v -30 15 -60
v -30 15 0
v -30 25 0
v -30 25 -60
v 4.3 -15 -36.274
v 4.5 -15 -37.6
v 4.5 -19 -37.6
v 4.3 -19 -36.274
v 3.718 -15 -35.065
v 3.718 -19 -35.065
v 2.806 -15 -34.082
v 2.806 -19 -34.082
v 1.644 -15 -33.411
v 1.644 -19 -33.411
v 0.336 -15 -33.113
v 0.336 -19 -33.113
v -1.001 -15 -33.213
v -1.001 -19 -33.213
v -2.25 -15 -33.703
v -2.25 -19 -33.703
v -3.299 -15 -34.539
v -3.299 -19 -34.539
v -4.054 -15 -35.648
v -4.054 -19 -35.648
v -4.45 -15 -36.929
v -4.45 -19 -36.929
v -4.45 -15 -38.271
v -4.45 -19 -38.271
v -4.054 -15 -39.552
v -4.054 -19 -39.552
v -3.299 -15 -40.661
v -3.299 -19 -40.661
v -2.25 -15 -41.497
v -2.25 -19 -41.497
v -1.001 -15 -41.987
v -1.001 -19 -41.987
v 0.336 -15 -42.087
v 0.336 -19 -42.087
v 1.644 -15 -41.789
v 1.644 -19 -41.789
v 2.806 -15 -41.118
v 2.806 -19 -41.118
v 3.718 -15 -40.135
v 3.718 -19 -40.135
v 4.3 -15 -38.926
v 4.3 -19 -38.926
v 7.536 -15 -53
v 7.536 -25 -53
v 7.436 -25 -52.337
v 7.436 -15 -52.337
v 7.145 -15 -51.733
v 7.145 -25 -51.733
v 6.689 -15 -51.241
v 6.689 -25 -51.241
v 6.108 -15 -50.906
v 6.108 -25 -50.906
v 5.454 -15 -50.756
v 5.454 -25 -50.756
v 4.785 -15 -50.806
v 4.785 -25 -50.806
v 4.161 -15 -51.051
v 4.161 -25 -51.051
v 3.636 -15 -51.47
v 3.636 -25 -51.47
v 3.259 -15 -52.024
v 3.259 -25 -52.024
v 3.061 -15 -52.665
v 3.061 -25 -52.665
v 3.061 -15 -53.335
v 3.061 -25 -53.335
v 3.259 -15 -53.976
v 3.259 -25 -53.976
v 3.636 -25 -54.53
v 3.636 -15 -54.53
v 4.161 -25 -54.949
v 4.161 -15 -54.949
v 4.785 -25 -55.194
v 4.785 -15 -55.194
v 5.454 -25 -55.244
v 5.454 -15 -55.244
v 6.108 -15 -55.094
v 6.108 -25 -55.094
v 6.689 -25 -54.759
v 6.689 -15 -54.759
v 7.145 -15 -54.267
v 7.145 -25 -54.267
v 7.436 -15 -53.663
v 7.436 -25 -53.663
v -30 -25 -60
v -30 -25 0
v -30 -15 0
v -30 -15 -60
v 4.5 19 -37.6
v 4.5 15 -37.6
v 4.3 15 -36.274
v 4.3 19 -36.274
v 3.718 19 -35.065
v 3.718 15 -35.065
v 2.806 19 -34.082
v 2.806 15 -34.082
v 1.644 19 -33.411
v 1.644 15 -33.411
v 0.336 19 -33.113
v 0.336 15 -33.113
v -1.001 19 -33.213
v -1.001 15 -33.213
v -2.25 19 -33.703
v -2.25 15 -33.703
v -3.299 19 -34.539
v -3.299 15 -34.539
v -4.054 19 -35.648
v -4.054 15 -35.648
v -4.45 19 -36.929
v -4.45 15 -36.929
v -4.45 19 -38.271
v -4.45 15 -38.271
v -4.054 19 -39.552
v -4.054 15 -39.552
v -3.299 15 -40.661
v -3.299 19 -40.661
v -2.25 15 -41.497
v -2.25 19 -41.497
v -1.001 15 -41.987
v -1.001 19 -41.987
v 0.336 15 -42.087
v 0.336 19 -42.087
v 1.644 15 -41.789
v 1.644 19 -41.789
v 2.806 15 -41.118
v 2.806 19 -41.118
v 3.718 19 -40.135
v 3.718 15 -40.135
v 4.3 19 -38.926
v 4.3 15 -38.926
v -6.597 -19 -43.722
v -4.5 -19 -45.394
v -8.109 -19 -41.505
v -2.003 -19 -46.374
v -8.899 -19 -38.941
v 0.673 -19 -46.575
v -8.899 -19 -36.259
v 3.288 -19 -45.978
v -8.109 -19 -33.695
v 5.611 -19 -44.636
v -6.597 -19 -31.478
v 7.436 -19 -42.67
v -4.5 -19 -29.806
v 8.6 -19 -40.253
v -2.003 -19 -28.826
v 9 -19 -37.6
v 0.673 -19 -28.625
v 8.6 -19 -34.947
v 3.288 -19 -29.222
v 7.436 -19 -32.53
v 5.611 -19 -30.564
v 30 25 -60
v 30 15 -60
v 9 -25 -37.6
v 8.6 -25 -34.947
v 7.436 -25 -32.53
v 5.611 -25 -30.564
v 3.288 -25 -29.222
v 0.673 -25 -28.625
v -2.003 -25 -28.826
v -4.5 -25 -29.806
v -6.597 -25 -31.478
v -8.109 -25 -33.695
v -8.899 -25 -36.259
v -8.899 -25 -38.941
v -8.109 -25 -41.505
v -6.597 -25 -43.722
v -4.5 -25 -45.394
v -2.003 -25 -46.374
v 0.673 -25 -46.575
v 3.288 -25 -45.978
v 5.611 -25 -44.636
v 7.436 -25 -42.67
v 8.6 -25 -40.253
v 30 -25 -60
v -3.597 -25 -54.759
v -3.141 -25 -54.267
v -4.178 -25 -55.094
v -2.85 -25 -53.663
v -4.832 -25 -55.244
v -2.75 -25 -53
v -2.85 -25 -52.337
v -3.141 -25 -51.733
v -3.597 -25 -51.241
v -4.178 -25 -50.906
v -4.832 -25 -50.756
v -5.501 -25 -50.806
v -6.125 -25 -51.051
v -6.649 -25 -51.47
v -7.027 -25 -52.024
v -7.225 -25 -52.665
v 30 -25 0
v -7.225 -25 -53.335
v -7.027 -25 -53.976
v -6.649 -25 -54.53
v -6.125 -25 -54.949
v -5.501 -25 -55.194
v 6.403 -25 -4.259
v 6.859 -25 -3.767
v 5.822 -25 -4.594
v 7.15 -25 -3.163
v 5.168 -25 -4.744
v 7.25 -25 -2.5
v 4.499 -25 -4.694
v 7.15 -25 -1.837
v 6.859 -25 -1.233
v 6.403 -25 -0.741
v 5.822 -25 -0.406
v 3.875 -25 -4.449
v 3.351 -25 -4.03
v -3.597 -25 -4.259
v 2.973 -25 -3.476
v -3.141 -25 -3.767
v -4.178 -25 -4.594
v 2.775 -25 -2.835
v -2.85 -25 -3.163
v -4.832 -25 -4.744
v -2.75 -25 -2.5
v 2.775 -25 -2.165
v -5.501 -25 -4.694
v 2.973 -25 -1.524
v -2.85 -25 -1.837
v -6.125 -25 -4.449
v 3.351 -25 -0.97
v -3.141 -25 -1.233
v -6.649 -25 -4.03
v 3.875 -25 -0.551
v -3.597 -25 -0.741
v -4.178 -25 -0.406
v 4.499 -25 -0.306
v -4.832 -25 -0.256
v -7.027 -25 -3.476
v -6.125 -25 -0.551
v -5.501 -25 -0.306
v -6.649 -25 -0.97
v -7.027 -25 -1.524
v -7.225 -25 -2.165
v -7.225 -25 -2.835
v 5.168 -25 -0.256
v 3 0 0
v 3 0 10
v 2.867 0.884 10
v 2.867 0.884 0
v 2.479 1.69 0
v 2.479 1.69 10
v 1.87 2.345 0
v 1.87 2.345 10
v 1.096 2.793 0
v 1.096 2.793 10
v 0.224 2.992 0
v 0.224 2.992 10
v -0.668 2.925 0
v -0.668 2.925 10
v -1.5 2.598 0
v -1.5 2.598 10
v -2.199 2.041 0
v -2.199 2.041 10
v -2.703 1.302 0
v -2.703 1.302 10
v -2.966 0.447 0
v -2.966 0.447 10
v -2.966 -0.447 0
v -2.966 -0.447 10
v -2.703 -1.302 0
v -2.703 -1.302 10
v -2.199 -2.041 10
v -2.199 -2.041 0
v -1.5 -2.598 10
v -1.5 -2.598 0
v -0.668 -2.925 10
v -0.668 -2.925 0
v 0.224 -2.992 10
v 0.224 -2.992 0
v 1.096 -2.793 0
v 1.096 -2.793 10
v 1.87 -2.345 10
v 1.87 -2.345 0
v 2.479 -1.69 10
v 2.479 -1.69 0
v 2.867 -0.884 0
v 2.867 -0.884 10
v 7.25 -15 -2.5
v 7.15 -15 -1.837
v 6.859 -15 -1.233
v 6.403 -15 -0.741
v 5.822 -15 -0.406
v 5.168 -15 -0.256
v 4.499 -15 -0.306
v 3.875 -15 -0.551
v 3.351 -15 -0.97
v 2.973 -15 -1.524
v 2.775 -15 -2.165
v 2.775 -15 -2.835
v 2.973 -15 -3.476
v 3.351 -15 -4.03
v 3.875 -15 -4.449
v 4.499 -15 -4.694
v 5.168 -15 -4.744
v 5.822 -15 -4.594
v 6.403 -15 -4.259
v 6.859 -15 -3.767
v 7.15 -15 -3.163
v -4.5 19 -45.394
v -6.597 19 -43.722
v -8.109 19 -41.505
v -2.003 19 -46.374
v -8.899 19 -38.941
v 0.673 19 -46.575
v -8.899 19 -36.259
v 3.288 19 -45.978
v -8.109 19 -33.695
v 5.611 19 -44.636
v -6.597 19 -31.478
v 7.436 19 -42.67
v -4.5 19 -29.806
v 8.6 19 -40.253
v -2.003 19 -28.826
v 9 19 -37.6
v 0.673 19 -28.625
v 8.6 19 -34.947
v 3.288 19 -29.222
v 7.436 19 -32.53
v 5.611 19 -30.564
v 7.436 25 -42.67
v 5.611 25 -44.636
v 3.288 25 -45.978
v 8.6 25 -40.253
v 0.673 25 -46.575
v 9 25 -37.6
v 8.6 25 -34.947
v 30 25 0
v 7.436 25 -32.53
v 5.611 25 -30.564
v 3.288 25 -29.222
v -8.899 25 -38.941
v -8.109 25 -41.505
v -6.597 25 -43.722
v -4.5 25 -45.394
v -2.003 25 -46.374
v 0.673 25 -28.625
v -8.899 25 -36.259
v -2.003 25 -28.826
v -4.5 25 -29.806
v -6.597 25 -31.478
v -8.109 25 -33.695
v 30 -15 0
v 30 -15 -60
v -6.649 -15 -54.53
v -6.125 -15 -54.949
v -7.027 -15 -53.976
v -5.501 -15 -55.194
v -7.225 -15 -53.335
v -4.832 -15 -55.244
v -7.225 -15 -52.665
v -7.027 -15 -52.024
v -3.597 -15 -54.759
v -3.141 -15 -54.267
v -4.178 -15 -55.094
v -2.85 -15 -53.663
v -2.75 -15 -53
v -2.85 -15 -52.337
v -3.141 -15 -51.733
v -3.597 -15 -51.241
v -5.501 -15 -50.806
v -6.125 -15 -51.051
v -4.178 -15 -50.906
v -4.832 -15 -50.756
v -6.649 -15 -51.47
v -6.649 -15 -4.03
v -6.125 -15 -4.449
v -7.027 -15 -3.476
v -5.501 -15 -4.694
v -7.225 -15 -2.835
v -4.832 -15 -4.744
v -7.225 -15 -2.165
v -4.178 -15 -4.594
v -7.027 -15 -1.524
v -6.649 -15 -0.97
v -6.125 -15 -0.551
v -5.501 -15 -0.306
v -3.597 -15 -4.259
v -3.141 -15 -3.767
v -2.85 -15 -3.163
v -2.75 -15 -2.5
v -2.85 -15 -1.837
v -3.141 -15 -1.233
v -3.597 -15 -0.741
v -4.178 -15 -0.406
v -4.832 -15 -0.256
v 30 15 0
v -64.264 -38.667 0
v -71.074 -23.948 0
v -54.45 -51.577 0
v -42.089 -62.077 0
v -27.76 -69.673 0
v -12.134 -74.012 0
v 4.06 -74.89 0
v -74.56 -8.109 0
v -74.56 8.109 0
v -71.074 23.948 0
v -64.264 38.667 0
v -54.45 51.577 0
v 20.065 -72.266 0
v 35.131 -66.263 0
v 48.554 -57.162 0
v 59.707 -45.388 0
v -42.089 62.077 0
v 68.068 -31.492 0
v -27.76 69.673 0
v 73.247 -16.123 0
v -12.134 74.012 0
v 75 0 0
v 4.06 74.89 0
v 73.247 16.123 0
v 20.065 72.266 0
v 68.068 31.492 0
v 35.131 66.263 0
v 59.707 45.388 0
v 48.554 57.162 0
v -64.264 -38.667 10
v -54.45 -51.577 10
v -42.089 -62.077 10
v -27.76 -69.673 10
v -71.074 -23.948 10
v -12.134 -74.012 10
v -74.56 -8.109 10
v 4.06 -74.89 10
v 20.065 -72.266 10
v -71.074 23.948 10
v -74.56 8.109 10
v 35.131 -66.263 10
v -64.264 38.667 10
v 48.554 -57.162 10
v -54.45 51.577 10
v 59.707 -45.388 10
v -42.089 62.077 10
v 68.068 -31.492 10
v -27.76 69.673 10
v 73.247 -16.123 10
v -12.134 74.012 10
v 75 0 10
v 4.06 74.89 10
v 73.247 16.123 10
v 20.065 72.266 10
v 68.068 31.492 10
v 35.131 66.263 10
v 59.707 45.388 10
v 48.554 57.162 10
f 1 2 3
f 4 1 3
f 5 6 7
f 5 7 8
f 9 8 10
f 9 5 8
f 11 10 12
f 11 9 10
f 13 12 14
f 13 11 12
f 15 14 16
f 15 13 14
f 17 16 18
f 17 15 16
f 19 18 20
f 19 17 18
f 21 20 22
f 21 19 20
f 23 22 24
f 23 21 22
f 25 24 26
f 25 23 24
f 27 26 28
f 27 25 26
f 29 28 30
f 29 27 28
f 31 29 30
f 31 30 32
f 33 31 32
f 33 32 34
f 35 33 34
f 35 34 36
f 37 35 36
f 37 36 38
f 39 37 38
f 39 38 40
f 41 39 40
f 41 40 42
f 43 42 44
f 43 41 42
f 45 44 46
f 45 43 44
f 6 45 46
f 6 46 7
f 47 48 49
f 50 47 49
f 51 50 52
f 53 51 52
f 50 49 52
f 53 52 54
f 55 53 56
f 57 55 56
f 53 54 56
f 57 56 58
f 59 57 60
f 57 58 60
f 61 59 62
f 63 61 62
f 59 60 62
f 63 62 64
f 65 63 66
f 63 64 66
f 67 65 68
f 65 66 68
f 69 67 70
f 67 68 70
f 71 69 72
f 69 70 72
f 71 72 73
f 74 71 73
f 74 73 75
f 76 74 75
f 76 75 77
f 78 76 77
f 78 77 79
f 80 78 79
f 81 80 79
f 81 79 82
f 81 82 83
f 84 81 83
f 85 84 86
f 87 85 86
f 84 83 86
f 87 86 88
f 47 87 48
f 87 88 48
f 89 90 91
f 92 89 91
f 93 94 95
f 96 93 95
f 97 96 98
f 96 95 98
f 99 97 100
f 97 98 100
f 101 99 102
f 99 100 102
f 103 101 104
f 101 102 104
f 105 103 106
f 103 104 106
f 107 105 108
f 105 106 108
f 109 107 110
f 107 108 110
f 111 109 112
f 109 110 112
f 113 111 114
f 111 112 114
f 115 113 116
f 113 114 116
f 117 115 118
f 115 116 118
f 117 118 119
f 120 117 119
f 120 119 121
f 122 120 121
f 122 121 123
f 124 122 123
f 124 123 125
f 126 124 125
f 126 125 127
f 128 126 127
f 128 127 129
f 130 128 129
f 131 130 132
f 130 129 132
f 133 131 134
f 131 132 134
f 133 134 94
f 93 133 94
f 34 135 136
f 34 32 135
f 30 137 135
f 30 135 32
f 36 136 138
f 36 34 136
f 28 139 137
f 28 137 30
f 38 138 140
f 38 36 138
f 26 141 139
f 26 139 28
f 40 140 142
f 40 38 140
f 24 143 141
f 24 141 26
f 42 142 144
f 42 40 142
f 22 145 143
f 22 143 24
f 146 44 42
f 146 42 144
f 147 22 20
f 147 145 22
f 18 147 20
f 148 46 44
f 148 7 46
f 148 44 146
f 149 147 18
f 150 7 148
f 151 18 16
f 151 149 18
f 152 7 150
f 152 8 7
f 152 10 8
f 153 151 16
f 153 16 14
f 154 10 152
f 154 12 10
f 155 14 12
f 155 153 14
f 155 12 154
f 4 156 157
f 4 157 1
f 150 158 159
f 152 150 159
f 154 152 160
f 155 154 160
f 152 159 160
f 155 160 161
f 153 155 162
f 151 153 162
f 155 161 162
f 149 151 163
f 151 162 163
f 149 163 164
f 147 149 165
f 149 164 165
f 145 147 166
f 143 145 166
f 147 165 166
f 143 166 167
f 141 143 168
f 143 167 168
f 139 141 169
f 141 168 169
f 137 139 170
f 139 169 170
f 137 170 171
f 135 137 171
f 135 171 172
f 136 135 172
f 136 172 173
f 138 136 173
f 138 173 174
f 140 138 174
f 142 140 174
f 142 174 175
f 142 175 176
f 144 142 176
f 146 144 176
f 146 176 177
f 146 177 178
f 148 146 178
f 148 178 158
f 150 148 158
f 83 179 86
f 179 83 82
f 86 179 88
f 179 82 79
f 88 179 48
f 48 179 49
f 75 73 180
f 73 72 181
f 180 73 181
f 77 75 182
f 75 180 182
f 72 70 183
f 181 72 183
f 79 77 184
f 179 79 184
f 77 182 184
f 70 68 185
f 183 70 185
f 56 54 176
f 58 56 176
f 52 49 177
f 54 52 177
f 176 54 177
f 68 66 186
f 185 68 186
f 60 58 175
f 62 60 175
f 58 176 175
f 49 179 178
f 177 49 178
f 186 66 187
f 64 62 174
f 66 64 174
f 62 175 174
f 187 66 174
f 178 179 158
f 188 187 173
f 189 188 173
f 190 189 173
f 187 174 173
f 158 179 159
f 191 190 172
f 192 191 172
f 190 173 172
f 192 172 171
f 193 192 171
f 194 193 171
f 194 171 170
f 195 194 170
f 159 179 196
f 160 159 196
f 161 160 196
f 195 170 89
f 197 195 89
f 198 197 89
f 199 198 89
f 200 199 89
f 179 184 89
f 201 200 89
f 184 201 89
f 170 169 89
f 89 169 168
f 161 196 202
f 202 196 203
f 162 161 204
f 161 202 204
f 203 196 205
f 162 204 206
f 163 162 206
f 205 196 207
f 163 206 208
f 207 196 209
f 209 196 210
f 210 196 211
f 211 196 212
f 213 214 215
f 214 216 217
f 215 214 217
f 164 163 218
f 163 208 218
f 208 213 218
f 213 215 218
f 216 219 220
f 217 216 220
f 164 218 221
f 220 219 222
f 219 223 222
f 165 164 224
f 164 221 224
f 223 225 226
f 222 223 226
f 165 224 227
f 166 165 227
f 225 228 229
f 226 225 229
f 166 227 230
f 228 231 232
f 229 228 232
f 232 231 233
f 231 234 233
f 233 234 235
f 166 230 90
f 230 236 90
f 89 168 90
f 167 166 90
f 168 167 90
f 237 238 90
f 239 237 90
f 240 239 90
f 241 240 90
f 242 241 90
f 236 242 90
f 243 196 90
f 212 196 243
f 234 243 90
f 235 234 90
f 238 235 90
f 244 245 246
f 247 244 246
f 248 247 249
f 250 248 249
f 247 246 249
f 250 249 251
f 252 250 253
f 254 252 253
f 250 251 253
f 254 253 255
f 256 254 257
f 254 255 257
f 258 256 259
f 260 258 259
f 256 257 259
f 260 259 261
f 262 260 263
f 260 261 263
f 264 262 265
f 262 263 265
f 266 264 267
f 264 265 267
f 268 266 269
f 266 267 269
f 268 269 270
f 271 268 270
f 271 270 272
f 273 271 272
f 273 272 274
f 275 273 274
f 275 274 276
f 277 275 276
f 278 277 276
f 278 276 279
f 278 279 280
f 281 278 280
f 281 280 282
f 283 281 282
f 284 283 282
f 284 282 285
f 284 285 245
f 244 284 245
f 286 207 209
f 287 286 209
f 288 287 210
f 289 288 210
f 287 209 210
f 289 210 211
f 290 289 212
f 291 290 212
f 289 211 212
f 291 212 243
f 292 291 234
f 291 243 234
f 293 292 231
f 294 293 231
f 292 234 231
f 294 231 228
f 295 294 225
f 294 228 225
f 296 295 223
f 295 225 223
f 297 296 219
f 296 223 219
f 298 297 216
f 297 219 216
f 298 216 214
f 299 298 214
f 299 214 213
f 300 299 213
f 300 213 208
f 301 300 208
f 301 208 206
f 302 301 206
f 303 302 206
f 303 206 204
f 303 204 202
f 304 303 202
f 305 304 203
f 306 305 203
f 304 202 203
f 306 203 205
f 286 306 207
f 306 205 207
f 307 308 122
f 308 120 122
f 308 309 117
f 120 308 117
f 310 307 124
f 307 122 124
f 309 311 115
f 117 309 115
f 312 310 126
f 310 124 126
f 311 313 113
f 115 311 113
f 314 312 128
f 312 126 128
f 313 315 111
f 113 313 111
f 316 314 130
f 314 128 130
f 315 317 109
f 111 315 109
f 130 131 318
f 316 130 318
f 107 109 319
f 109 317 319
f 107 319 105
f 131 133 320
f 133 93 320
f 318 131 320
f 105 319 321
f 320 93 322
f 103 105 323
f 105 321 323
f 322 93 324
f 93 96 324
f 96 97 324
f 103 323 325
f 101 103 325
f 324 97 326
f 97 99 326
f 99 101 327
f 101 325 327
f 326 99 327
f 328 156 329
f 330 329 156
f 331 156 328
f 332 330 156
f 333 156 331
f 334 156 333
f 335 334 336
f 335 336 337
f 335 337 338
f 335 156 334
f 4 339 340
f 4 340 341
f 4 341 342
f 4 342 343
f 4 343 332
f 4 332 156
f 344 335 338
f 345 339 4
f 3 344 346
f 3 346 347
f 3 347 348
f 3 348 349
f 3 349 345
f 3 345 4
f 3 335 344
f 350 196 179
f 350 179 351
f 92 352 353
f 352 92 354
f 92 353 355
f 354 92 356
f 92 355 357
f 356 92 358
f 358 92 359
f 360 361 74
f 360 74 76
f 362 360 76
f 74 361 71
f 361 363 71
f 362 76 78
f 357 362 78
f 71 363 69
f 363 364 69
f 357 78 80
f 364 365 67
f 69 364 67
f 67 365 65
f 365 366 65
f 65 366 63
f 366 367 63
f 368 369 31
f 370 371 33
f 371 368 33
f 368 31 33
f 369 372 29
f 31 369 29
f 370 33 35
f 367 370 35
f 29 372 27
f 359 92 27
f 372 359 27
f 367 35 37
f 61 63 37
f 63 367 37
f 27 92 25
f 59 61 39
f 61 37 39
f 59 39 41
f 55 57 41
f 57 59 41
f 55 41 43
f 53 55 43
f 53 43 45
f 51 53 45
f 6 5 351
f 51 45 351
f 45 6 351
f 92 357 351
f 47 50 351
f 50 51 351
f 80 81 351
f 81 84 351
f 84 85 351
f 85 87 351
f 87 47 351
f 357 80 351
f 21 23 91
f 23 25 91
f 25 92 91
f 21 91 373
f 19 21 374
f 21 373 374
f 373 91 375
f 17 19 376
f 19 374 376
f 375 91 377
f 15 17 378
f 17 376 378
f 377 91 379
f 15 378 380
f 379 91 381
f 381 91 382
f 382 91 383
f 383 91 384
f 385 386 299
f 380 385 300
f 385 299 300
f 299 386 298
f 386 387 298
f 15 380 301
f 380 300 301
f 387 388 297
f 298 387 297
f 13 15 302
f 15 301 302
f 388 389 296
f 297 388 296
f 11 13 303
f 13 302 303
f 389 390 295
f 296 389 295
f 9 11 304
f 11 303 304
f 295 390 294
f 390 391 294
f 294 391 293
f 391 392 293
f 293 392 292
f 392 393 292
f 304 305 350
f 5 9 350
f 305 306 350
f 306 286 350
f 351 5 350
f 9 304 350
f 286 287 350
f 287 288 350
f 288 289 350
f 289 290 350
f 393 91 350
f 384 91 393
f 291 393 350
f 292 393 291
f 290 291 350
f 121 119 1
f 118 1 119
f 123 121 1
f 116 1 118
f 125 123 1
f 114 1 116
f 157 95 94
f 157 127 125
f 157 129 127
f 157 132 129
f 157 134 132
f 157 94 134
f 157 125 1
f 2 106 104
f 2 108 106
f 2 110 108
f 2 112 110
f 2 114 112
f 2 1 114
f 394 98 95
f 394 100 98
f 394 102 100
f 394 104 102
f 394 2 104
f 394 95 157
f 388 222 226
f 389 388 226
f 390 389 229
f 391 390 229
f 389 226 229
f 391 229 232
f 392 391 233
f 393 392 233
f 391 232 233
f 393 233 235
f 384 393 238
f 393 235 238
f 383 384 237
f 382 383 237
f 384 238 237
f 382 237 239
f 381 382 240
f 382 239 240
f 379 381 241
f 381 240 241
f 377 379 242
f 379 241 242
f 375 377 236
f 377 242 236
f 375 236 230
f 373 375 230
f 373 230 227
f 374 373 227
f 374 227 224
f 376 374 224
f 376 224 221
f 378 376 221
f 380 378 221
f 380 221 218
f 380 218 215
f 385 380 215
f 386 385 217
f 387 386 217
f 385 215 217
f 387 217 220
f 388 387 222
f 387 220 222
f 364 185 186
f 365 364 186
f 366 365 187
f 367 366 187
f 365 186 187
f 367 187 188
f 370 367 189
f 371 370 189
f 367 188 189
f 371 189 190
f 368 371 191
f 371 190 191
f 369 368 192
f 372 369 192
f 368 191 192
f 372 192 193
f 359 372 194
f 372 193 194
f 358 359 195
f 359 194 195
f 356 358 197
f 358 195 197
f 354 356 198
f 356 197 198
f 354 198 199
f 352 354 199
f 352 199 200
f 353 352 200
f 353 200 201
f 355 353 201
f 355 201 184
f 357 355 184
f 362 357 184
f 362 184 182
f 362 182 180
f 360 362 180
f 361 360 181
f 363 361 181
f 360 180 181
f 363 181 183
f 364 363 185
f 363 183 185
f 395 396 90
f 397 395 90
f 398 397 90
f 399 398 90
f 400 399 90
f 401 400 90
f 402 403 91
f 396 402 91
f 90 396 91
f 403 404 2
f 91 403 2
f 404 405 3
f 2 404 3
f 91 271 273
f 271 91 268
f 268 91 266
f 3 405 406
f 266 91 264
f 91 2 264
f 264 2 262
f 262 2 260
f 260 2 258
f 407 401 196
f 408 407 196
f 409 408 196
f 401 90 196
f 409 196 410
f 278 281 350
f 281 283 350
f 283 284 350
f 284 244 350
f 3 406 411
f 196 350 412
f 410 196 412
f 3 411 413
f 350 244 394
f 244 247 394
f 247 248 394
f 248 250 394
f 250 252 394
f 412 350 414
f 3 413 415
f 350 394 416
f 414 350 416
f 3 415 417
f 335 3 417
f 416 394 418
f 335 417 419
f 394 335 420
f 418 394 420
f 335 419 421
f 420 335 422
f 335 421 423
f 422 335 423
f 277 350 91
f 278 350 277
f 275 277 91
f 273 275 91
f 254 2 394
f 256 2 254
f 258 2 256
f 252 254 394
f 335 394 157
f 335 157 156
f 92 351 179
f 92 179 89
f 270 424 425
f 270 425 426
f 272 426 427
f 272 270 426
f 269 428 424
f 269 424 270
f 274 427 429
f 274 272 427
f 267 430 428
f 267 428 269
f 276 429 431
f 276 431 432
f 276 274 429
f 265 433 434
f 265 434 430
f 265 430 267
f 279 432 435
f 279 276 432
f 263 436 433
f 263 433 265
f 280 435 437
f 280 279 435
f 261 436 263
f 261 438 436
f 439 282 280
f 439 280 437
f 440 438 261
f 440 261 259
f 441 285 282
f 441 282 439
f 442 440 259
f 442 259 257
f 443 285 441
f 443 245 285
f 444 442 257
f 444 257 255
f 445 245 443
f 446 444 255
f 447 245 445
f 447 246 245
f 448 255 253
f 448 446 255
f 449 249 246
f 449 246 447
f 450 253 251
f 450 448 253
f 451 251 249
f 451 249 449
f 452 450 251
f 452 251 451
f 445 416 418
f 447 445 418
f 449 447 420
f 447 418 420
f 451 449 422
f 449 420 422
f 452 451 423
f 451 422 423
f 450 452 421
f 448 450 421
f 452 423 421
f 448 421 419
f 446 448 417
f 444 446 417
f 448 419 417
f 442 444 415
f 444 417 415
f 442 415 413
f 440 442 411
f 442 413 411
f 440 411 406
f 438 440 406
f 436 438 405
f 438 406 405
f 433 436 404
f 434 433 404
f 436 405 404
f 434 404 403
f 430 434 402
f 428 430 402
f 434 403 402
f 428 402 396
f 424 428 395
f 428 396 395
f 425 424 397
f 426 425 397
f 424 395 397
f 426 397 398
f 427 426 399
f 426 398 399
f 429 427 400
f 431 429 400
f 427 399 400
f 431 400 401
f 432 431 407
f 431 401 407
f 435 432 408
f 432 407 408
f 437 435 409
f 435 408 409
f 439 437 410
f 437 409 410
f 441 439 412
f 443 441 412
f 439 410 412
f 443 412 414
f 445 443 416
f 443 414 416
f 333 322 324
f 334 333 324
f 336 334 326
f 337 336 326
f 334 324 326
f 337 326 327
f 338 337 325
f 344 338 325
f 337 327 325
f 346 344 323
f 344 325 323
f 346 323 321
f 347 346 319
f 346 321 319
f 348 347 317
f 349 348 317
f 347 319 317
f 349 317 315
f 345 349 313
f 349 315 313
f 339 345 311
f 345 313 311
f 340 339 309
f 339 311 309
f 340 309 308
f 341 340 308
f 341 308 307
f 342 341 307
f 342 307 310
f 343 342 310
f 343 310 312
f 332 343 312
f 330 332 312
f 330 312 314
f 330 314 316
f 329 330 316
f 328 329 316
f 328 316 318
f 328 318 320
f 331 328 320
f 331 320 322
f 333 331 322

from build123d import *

# Parameters (mm, degrees)
SKETCH1_R           = 75
BOSS_EXTRUDE1_DEPTH = 10
CUT_EXTRUDE1_REACH  = 12
SKETCH2_R           = 3
SKETCH3_W           = 60
SKETCH3_H           = 10
BOSS_EXTRUDE2_DEPTH = 60
SKETCH4_R           = 9
CUT_EXTRUDE2_DEPTH  = 101
SKETCH6_R           = 9
SKETCH6_R_2         = 4.5
BOSS_EXTRUDE3_DEPTH = 4
SKETCH9_R           = 2.25
CUT_EXTRUDE5_DEPTH  = 10


with BuildPart() as part:
    # Sketch1 → Boss-Extrude1 (new body)
    with BuildSketch(Plane.XY):
        Circle(SKETCH1_R)
    extrude(amount=BOSS_EXTRUDE1_DEPTH)

    # Sketch2 → Cut-Extrude1 (cut, up to next)
    with BuildSketch(Plane.XY.offset(10), mode=Mode.PRIVATE) as cut_extrude1_sk1:
        Circle(SKETCH2_R)
    cut_extrude1_tool1 = extrude(cut_extrude1_sk1.sketch, amount=-CUT_EXTRUDE1_REACH, mode=Mode.PRIVATE) & part.part
    add(cut_extrude1_tool1.solids().sort_by_distance((0, 0, 10))[0], mode=Mode.SUBTRACT)

    # Sketch3 → Boss-Extrude2 (add)
    with BuildSketch(Plane(origin=(0, 0, 0), x_dir=(-1, 0, 0), z_dir=(0, 0, -1))):
        with Locations((0, 20)):
            Rectangle(SKETCH3_W, SKETCH3_H)
        with Locations((0, -20)):
            Rectangle(SKETCH3_W, SKETCH3_H)
    extrude(amount=BOSS_EXTRUDE2_DEPTH)

    # Sketch4 → Cut-Extrude2 (cut, through all)
    with BuildSketch(Plane.XZ.offset(25)):
        with Locations((0, -37.6)):
            Circle(SKETCH4_R)
    extrude(amount=-CUT_EXTRUDE2_DEPTH, mode=Mode.SUBTRACT)

    # Sketch6 → Boss-Extrude3 (add)
    with BuildSketch(Plane.XZ.offset(-15)):
        with Locations((0, -37.6)):
            Circle(SKETCH6_R)
        with Locations((0, -37.6)):
            Circle(SKETCH6_R_2, mode=Mode.SUBTRACT)
    boss_extrude3 = extrude(amount=-BOSS_EXTRUDE3_DEPTH)

    # Sketch9 → Cut-Extrude5 (cut)
    with BuildSketch(Plane.XZ.offset(25)):
        with Locations((-5, -2.5)):
            Circle(SKETCH9_R)
        with Locations((5, -2.5)):
            Circle(SKETCH9_R)
        with Locations((-5, -53)):
            Circle(SKETCH9_R)
        with Locations((5.285793913, -53)):
            Circle(SKETCH9_R)
    extrude(amount=-CUT_EXTRUDE5_DEPTH, mode=Mode.SUBTRACT)

    # Mirror1: Boss-Extrude3 across plane
    add(boss_extrude3.mirror(Plane.ZX))


solid = part.part
